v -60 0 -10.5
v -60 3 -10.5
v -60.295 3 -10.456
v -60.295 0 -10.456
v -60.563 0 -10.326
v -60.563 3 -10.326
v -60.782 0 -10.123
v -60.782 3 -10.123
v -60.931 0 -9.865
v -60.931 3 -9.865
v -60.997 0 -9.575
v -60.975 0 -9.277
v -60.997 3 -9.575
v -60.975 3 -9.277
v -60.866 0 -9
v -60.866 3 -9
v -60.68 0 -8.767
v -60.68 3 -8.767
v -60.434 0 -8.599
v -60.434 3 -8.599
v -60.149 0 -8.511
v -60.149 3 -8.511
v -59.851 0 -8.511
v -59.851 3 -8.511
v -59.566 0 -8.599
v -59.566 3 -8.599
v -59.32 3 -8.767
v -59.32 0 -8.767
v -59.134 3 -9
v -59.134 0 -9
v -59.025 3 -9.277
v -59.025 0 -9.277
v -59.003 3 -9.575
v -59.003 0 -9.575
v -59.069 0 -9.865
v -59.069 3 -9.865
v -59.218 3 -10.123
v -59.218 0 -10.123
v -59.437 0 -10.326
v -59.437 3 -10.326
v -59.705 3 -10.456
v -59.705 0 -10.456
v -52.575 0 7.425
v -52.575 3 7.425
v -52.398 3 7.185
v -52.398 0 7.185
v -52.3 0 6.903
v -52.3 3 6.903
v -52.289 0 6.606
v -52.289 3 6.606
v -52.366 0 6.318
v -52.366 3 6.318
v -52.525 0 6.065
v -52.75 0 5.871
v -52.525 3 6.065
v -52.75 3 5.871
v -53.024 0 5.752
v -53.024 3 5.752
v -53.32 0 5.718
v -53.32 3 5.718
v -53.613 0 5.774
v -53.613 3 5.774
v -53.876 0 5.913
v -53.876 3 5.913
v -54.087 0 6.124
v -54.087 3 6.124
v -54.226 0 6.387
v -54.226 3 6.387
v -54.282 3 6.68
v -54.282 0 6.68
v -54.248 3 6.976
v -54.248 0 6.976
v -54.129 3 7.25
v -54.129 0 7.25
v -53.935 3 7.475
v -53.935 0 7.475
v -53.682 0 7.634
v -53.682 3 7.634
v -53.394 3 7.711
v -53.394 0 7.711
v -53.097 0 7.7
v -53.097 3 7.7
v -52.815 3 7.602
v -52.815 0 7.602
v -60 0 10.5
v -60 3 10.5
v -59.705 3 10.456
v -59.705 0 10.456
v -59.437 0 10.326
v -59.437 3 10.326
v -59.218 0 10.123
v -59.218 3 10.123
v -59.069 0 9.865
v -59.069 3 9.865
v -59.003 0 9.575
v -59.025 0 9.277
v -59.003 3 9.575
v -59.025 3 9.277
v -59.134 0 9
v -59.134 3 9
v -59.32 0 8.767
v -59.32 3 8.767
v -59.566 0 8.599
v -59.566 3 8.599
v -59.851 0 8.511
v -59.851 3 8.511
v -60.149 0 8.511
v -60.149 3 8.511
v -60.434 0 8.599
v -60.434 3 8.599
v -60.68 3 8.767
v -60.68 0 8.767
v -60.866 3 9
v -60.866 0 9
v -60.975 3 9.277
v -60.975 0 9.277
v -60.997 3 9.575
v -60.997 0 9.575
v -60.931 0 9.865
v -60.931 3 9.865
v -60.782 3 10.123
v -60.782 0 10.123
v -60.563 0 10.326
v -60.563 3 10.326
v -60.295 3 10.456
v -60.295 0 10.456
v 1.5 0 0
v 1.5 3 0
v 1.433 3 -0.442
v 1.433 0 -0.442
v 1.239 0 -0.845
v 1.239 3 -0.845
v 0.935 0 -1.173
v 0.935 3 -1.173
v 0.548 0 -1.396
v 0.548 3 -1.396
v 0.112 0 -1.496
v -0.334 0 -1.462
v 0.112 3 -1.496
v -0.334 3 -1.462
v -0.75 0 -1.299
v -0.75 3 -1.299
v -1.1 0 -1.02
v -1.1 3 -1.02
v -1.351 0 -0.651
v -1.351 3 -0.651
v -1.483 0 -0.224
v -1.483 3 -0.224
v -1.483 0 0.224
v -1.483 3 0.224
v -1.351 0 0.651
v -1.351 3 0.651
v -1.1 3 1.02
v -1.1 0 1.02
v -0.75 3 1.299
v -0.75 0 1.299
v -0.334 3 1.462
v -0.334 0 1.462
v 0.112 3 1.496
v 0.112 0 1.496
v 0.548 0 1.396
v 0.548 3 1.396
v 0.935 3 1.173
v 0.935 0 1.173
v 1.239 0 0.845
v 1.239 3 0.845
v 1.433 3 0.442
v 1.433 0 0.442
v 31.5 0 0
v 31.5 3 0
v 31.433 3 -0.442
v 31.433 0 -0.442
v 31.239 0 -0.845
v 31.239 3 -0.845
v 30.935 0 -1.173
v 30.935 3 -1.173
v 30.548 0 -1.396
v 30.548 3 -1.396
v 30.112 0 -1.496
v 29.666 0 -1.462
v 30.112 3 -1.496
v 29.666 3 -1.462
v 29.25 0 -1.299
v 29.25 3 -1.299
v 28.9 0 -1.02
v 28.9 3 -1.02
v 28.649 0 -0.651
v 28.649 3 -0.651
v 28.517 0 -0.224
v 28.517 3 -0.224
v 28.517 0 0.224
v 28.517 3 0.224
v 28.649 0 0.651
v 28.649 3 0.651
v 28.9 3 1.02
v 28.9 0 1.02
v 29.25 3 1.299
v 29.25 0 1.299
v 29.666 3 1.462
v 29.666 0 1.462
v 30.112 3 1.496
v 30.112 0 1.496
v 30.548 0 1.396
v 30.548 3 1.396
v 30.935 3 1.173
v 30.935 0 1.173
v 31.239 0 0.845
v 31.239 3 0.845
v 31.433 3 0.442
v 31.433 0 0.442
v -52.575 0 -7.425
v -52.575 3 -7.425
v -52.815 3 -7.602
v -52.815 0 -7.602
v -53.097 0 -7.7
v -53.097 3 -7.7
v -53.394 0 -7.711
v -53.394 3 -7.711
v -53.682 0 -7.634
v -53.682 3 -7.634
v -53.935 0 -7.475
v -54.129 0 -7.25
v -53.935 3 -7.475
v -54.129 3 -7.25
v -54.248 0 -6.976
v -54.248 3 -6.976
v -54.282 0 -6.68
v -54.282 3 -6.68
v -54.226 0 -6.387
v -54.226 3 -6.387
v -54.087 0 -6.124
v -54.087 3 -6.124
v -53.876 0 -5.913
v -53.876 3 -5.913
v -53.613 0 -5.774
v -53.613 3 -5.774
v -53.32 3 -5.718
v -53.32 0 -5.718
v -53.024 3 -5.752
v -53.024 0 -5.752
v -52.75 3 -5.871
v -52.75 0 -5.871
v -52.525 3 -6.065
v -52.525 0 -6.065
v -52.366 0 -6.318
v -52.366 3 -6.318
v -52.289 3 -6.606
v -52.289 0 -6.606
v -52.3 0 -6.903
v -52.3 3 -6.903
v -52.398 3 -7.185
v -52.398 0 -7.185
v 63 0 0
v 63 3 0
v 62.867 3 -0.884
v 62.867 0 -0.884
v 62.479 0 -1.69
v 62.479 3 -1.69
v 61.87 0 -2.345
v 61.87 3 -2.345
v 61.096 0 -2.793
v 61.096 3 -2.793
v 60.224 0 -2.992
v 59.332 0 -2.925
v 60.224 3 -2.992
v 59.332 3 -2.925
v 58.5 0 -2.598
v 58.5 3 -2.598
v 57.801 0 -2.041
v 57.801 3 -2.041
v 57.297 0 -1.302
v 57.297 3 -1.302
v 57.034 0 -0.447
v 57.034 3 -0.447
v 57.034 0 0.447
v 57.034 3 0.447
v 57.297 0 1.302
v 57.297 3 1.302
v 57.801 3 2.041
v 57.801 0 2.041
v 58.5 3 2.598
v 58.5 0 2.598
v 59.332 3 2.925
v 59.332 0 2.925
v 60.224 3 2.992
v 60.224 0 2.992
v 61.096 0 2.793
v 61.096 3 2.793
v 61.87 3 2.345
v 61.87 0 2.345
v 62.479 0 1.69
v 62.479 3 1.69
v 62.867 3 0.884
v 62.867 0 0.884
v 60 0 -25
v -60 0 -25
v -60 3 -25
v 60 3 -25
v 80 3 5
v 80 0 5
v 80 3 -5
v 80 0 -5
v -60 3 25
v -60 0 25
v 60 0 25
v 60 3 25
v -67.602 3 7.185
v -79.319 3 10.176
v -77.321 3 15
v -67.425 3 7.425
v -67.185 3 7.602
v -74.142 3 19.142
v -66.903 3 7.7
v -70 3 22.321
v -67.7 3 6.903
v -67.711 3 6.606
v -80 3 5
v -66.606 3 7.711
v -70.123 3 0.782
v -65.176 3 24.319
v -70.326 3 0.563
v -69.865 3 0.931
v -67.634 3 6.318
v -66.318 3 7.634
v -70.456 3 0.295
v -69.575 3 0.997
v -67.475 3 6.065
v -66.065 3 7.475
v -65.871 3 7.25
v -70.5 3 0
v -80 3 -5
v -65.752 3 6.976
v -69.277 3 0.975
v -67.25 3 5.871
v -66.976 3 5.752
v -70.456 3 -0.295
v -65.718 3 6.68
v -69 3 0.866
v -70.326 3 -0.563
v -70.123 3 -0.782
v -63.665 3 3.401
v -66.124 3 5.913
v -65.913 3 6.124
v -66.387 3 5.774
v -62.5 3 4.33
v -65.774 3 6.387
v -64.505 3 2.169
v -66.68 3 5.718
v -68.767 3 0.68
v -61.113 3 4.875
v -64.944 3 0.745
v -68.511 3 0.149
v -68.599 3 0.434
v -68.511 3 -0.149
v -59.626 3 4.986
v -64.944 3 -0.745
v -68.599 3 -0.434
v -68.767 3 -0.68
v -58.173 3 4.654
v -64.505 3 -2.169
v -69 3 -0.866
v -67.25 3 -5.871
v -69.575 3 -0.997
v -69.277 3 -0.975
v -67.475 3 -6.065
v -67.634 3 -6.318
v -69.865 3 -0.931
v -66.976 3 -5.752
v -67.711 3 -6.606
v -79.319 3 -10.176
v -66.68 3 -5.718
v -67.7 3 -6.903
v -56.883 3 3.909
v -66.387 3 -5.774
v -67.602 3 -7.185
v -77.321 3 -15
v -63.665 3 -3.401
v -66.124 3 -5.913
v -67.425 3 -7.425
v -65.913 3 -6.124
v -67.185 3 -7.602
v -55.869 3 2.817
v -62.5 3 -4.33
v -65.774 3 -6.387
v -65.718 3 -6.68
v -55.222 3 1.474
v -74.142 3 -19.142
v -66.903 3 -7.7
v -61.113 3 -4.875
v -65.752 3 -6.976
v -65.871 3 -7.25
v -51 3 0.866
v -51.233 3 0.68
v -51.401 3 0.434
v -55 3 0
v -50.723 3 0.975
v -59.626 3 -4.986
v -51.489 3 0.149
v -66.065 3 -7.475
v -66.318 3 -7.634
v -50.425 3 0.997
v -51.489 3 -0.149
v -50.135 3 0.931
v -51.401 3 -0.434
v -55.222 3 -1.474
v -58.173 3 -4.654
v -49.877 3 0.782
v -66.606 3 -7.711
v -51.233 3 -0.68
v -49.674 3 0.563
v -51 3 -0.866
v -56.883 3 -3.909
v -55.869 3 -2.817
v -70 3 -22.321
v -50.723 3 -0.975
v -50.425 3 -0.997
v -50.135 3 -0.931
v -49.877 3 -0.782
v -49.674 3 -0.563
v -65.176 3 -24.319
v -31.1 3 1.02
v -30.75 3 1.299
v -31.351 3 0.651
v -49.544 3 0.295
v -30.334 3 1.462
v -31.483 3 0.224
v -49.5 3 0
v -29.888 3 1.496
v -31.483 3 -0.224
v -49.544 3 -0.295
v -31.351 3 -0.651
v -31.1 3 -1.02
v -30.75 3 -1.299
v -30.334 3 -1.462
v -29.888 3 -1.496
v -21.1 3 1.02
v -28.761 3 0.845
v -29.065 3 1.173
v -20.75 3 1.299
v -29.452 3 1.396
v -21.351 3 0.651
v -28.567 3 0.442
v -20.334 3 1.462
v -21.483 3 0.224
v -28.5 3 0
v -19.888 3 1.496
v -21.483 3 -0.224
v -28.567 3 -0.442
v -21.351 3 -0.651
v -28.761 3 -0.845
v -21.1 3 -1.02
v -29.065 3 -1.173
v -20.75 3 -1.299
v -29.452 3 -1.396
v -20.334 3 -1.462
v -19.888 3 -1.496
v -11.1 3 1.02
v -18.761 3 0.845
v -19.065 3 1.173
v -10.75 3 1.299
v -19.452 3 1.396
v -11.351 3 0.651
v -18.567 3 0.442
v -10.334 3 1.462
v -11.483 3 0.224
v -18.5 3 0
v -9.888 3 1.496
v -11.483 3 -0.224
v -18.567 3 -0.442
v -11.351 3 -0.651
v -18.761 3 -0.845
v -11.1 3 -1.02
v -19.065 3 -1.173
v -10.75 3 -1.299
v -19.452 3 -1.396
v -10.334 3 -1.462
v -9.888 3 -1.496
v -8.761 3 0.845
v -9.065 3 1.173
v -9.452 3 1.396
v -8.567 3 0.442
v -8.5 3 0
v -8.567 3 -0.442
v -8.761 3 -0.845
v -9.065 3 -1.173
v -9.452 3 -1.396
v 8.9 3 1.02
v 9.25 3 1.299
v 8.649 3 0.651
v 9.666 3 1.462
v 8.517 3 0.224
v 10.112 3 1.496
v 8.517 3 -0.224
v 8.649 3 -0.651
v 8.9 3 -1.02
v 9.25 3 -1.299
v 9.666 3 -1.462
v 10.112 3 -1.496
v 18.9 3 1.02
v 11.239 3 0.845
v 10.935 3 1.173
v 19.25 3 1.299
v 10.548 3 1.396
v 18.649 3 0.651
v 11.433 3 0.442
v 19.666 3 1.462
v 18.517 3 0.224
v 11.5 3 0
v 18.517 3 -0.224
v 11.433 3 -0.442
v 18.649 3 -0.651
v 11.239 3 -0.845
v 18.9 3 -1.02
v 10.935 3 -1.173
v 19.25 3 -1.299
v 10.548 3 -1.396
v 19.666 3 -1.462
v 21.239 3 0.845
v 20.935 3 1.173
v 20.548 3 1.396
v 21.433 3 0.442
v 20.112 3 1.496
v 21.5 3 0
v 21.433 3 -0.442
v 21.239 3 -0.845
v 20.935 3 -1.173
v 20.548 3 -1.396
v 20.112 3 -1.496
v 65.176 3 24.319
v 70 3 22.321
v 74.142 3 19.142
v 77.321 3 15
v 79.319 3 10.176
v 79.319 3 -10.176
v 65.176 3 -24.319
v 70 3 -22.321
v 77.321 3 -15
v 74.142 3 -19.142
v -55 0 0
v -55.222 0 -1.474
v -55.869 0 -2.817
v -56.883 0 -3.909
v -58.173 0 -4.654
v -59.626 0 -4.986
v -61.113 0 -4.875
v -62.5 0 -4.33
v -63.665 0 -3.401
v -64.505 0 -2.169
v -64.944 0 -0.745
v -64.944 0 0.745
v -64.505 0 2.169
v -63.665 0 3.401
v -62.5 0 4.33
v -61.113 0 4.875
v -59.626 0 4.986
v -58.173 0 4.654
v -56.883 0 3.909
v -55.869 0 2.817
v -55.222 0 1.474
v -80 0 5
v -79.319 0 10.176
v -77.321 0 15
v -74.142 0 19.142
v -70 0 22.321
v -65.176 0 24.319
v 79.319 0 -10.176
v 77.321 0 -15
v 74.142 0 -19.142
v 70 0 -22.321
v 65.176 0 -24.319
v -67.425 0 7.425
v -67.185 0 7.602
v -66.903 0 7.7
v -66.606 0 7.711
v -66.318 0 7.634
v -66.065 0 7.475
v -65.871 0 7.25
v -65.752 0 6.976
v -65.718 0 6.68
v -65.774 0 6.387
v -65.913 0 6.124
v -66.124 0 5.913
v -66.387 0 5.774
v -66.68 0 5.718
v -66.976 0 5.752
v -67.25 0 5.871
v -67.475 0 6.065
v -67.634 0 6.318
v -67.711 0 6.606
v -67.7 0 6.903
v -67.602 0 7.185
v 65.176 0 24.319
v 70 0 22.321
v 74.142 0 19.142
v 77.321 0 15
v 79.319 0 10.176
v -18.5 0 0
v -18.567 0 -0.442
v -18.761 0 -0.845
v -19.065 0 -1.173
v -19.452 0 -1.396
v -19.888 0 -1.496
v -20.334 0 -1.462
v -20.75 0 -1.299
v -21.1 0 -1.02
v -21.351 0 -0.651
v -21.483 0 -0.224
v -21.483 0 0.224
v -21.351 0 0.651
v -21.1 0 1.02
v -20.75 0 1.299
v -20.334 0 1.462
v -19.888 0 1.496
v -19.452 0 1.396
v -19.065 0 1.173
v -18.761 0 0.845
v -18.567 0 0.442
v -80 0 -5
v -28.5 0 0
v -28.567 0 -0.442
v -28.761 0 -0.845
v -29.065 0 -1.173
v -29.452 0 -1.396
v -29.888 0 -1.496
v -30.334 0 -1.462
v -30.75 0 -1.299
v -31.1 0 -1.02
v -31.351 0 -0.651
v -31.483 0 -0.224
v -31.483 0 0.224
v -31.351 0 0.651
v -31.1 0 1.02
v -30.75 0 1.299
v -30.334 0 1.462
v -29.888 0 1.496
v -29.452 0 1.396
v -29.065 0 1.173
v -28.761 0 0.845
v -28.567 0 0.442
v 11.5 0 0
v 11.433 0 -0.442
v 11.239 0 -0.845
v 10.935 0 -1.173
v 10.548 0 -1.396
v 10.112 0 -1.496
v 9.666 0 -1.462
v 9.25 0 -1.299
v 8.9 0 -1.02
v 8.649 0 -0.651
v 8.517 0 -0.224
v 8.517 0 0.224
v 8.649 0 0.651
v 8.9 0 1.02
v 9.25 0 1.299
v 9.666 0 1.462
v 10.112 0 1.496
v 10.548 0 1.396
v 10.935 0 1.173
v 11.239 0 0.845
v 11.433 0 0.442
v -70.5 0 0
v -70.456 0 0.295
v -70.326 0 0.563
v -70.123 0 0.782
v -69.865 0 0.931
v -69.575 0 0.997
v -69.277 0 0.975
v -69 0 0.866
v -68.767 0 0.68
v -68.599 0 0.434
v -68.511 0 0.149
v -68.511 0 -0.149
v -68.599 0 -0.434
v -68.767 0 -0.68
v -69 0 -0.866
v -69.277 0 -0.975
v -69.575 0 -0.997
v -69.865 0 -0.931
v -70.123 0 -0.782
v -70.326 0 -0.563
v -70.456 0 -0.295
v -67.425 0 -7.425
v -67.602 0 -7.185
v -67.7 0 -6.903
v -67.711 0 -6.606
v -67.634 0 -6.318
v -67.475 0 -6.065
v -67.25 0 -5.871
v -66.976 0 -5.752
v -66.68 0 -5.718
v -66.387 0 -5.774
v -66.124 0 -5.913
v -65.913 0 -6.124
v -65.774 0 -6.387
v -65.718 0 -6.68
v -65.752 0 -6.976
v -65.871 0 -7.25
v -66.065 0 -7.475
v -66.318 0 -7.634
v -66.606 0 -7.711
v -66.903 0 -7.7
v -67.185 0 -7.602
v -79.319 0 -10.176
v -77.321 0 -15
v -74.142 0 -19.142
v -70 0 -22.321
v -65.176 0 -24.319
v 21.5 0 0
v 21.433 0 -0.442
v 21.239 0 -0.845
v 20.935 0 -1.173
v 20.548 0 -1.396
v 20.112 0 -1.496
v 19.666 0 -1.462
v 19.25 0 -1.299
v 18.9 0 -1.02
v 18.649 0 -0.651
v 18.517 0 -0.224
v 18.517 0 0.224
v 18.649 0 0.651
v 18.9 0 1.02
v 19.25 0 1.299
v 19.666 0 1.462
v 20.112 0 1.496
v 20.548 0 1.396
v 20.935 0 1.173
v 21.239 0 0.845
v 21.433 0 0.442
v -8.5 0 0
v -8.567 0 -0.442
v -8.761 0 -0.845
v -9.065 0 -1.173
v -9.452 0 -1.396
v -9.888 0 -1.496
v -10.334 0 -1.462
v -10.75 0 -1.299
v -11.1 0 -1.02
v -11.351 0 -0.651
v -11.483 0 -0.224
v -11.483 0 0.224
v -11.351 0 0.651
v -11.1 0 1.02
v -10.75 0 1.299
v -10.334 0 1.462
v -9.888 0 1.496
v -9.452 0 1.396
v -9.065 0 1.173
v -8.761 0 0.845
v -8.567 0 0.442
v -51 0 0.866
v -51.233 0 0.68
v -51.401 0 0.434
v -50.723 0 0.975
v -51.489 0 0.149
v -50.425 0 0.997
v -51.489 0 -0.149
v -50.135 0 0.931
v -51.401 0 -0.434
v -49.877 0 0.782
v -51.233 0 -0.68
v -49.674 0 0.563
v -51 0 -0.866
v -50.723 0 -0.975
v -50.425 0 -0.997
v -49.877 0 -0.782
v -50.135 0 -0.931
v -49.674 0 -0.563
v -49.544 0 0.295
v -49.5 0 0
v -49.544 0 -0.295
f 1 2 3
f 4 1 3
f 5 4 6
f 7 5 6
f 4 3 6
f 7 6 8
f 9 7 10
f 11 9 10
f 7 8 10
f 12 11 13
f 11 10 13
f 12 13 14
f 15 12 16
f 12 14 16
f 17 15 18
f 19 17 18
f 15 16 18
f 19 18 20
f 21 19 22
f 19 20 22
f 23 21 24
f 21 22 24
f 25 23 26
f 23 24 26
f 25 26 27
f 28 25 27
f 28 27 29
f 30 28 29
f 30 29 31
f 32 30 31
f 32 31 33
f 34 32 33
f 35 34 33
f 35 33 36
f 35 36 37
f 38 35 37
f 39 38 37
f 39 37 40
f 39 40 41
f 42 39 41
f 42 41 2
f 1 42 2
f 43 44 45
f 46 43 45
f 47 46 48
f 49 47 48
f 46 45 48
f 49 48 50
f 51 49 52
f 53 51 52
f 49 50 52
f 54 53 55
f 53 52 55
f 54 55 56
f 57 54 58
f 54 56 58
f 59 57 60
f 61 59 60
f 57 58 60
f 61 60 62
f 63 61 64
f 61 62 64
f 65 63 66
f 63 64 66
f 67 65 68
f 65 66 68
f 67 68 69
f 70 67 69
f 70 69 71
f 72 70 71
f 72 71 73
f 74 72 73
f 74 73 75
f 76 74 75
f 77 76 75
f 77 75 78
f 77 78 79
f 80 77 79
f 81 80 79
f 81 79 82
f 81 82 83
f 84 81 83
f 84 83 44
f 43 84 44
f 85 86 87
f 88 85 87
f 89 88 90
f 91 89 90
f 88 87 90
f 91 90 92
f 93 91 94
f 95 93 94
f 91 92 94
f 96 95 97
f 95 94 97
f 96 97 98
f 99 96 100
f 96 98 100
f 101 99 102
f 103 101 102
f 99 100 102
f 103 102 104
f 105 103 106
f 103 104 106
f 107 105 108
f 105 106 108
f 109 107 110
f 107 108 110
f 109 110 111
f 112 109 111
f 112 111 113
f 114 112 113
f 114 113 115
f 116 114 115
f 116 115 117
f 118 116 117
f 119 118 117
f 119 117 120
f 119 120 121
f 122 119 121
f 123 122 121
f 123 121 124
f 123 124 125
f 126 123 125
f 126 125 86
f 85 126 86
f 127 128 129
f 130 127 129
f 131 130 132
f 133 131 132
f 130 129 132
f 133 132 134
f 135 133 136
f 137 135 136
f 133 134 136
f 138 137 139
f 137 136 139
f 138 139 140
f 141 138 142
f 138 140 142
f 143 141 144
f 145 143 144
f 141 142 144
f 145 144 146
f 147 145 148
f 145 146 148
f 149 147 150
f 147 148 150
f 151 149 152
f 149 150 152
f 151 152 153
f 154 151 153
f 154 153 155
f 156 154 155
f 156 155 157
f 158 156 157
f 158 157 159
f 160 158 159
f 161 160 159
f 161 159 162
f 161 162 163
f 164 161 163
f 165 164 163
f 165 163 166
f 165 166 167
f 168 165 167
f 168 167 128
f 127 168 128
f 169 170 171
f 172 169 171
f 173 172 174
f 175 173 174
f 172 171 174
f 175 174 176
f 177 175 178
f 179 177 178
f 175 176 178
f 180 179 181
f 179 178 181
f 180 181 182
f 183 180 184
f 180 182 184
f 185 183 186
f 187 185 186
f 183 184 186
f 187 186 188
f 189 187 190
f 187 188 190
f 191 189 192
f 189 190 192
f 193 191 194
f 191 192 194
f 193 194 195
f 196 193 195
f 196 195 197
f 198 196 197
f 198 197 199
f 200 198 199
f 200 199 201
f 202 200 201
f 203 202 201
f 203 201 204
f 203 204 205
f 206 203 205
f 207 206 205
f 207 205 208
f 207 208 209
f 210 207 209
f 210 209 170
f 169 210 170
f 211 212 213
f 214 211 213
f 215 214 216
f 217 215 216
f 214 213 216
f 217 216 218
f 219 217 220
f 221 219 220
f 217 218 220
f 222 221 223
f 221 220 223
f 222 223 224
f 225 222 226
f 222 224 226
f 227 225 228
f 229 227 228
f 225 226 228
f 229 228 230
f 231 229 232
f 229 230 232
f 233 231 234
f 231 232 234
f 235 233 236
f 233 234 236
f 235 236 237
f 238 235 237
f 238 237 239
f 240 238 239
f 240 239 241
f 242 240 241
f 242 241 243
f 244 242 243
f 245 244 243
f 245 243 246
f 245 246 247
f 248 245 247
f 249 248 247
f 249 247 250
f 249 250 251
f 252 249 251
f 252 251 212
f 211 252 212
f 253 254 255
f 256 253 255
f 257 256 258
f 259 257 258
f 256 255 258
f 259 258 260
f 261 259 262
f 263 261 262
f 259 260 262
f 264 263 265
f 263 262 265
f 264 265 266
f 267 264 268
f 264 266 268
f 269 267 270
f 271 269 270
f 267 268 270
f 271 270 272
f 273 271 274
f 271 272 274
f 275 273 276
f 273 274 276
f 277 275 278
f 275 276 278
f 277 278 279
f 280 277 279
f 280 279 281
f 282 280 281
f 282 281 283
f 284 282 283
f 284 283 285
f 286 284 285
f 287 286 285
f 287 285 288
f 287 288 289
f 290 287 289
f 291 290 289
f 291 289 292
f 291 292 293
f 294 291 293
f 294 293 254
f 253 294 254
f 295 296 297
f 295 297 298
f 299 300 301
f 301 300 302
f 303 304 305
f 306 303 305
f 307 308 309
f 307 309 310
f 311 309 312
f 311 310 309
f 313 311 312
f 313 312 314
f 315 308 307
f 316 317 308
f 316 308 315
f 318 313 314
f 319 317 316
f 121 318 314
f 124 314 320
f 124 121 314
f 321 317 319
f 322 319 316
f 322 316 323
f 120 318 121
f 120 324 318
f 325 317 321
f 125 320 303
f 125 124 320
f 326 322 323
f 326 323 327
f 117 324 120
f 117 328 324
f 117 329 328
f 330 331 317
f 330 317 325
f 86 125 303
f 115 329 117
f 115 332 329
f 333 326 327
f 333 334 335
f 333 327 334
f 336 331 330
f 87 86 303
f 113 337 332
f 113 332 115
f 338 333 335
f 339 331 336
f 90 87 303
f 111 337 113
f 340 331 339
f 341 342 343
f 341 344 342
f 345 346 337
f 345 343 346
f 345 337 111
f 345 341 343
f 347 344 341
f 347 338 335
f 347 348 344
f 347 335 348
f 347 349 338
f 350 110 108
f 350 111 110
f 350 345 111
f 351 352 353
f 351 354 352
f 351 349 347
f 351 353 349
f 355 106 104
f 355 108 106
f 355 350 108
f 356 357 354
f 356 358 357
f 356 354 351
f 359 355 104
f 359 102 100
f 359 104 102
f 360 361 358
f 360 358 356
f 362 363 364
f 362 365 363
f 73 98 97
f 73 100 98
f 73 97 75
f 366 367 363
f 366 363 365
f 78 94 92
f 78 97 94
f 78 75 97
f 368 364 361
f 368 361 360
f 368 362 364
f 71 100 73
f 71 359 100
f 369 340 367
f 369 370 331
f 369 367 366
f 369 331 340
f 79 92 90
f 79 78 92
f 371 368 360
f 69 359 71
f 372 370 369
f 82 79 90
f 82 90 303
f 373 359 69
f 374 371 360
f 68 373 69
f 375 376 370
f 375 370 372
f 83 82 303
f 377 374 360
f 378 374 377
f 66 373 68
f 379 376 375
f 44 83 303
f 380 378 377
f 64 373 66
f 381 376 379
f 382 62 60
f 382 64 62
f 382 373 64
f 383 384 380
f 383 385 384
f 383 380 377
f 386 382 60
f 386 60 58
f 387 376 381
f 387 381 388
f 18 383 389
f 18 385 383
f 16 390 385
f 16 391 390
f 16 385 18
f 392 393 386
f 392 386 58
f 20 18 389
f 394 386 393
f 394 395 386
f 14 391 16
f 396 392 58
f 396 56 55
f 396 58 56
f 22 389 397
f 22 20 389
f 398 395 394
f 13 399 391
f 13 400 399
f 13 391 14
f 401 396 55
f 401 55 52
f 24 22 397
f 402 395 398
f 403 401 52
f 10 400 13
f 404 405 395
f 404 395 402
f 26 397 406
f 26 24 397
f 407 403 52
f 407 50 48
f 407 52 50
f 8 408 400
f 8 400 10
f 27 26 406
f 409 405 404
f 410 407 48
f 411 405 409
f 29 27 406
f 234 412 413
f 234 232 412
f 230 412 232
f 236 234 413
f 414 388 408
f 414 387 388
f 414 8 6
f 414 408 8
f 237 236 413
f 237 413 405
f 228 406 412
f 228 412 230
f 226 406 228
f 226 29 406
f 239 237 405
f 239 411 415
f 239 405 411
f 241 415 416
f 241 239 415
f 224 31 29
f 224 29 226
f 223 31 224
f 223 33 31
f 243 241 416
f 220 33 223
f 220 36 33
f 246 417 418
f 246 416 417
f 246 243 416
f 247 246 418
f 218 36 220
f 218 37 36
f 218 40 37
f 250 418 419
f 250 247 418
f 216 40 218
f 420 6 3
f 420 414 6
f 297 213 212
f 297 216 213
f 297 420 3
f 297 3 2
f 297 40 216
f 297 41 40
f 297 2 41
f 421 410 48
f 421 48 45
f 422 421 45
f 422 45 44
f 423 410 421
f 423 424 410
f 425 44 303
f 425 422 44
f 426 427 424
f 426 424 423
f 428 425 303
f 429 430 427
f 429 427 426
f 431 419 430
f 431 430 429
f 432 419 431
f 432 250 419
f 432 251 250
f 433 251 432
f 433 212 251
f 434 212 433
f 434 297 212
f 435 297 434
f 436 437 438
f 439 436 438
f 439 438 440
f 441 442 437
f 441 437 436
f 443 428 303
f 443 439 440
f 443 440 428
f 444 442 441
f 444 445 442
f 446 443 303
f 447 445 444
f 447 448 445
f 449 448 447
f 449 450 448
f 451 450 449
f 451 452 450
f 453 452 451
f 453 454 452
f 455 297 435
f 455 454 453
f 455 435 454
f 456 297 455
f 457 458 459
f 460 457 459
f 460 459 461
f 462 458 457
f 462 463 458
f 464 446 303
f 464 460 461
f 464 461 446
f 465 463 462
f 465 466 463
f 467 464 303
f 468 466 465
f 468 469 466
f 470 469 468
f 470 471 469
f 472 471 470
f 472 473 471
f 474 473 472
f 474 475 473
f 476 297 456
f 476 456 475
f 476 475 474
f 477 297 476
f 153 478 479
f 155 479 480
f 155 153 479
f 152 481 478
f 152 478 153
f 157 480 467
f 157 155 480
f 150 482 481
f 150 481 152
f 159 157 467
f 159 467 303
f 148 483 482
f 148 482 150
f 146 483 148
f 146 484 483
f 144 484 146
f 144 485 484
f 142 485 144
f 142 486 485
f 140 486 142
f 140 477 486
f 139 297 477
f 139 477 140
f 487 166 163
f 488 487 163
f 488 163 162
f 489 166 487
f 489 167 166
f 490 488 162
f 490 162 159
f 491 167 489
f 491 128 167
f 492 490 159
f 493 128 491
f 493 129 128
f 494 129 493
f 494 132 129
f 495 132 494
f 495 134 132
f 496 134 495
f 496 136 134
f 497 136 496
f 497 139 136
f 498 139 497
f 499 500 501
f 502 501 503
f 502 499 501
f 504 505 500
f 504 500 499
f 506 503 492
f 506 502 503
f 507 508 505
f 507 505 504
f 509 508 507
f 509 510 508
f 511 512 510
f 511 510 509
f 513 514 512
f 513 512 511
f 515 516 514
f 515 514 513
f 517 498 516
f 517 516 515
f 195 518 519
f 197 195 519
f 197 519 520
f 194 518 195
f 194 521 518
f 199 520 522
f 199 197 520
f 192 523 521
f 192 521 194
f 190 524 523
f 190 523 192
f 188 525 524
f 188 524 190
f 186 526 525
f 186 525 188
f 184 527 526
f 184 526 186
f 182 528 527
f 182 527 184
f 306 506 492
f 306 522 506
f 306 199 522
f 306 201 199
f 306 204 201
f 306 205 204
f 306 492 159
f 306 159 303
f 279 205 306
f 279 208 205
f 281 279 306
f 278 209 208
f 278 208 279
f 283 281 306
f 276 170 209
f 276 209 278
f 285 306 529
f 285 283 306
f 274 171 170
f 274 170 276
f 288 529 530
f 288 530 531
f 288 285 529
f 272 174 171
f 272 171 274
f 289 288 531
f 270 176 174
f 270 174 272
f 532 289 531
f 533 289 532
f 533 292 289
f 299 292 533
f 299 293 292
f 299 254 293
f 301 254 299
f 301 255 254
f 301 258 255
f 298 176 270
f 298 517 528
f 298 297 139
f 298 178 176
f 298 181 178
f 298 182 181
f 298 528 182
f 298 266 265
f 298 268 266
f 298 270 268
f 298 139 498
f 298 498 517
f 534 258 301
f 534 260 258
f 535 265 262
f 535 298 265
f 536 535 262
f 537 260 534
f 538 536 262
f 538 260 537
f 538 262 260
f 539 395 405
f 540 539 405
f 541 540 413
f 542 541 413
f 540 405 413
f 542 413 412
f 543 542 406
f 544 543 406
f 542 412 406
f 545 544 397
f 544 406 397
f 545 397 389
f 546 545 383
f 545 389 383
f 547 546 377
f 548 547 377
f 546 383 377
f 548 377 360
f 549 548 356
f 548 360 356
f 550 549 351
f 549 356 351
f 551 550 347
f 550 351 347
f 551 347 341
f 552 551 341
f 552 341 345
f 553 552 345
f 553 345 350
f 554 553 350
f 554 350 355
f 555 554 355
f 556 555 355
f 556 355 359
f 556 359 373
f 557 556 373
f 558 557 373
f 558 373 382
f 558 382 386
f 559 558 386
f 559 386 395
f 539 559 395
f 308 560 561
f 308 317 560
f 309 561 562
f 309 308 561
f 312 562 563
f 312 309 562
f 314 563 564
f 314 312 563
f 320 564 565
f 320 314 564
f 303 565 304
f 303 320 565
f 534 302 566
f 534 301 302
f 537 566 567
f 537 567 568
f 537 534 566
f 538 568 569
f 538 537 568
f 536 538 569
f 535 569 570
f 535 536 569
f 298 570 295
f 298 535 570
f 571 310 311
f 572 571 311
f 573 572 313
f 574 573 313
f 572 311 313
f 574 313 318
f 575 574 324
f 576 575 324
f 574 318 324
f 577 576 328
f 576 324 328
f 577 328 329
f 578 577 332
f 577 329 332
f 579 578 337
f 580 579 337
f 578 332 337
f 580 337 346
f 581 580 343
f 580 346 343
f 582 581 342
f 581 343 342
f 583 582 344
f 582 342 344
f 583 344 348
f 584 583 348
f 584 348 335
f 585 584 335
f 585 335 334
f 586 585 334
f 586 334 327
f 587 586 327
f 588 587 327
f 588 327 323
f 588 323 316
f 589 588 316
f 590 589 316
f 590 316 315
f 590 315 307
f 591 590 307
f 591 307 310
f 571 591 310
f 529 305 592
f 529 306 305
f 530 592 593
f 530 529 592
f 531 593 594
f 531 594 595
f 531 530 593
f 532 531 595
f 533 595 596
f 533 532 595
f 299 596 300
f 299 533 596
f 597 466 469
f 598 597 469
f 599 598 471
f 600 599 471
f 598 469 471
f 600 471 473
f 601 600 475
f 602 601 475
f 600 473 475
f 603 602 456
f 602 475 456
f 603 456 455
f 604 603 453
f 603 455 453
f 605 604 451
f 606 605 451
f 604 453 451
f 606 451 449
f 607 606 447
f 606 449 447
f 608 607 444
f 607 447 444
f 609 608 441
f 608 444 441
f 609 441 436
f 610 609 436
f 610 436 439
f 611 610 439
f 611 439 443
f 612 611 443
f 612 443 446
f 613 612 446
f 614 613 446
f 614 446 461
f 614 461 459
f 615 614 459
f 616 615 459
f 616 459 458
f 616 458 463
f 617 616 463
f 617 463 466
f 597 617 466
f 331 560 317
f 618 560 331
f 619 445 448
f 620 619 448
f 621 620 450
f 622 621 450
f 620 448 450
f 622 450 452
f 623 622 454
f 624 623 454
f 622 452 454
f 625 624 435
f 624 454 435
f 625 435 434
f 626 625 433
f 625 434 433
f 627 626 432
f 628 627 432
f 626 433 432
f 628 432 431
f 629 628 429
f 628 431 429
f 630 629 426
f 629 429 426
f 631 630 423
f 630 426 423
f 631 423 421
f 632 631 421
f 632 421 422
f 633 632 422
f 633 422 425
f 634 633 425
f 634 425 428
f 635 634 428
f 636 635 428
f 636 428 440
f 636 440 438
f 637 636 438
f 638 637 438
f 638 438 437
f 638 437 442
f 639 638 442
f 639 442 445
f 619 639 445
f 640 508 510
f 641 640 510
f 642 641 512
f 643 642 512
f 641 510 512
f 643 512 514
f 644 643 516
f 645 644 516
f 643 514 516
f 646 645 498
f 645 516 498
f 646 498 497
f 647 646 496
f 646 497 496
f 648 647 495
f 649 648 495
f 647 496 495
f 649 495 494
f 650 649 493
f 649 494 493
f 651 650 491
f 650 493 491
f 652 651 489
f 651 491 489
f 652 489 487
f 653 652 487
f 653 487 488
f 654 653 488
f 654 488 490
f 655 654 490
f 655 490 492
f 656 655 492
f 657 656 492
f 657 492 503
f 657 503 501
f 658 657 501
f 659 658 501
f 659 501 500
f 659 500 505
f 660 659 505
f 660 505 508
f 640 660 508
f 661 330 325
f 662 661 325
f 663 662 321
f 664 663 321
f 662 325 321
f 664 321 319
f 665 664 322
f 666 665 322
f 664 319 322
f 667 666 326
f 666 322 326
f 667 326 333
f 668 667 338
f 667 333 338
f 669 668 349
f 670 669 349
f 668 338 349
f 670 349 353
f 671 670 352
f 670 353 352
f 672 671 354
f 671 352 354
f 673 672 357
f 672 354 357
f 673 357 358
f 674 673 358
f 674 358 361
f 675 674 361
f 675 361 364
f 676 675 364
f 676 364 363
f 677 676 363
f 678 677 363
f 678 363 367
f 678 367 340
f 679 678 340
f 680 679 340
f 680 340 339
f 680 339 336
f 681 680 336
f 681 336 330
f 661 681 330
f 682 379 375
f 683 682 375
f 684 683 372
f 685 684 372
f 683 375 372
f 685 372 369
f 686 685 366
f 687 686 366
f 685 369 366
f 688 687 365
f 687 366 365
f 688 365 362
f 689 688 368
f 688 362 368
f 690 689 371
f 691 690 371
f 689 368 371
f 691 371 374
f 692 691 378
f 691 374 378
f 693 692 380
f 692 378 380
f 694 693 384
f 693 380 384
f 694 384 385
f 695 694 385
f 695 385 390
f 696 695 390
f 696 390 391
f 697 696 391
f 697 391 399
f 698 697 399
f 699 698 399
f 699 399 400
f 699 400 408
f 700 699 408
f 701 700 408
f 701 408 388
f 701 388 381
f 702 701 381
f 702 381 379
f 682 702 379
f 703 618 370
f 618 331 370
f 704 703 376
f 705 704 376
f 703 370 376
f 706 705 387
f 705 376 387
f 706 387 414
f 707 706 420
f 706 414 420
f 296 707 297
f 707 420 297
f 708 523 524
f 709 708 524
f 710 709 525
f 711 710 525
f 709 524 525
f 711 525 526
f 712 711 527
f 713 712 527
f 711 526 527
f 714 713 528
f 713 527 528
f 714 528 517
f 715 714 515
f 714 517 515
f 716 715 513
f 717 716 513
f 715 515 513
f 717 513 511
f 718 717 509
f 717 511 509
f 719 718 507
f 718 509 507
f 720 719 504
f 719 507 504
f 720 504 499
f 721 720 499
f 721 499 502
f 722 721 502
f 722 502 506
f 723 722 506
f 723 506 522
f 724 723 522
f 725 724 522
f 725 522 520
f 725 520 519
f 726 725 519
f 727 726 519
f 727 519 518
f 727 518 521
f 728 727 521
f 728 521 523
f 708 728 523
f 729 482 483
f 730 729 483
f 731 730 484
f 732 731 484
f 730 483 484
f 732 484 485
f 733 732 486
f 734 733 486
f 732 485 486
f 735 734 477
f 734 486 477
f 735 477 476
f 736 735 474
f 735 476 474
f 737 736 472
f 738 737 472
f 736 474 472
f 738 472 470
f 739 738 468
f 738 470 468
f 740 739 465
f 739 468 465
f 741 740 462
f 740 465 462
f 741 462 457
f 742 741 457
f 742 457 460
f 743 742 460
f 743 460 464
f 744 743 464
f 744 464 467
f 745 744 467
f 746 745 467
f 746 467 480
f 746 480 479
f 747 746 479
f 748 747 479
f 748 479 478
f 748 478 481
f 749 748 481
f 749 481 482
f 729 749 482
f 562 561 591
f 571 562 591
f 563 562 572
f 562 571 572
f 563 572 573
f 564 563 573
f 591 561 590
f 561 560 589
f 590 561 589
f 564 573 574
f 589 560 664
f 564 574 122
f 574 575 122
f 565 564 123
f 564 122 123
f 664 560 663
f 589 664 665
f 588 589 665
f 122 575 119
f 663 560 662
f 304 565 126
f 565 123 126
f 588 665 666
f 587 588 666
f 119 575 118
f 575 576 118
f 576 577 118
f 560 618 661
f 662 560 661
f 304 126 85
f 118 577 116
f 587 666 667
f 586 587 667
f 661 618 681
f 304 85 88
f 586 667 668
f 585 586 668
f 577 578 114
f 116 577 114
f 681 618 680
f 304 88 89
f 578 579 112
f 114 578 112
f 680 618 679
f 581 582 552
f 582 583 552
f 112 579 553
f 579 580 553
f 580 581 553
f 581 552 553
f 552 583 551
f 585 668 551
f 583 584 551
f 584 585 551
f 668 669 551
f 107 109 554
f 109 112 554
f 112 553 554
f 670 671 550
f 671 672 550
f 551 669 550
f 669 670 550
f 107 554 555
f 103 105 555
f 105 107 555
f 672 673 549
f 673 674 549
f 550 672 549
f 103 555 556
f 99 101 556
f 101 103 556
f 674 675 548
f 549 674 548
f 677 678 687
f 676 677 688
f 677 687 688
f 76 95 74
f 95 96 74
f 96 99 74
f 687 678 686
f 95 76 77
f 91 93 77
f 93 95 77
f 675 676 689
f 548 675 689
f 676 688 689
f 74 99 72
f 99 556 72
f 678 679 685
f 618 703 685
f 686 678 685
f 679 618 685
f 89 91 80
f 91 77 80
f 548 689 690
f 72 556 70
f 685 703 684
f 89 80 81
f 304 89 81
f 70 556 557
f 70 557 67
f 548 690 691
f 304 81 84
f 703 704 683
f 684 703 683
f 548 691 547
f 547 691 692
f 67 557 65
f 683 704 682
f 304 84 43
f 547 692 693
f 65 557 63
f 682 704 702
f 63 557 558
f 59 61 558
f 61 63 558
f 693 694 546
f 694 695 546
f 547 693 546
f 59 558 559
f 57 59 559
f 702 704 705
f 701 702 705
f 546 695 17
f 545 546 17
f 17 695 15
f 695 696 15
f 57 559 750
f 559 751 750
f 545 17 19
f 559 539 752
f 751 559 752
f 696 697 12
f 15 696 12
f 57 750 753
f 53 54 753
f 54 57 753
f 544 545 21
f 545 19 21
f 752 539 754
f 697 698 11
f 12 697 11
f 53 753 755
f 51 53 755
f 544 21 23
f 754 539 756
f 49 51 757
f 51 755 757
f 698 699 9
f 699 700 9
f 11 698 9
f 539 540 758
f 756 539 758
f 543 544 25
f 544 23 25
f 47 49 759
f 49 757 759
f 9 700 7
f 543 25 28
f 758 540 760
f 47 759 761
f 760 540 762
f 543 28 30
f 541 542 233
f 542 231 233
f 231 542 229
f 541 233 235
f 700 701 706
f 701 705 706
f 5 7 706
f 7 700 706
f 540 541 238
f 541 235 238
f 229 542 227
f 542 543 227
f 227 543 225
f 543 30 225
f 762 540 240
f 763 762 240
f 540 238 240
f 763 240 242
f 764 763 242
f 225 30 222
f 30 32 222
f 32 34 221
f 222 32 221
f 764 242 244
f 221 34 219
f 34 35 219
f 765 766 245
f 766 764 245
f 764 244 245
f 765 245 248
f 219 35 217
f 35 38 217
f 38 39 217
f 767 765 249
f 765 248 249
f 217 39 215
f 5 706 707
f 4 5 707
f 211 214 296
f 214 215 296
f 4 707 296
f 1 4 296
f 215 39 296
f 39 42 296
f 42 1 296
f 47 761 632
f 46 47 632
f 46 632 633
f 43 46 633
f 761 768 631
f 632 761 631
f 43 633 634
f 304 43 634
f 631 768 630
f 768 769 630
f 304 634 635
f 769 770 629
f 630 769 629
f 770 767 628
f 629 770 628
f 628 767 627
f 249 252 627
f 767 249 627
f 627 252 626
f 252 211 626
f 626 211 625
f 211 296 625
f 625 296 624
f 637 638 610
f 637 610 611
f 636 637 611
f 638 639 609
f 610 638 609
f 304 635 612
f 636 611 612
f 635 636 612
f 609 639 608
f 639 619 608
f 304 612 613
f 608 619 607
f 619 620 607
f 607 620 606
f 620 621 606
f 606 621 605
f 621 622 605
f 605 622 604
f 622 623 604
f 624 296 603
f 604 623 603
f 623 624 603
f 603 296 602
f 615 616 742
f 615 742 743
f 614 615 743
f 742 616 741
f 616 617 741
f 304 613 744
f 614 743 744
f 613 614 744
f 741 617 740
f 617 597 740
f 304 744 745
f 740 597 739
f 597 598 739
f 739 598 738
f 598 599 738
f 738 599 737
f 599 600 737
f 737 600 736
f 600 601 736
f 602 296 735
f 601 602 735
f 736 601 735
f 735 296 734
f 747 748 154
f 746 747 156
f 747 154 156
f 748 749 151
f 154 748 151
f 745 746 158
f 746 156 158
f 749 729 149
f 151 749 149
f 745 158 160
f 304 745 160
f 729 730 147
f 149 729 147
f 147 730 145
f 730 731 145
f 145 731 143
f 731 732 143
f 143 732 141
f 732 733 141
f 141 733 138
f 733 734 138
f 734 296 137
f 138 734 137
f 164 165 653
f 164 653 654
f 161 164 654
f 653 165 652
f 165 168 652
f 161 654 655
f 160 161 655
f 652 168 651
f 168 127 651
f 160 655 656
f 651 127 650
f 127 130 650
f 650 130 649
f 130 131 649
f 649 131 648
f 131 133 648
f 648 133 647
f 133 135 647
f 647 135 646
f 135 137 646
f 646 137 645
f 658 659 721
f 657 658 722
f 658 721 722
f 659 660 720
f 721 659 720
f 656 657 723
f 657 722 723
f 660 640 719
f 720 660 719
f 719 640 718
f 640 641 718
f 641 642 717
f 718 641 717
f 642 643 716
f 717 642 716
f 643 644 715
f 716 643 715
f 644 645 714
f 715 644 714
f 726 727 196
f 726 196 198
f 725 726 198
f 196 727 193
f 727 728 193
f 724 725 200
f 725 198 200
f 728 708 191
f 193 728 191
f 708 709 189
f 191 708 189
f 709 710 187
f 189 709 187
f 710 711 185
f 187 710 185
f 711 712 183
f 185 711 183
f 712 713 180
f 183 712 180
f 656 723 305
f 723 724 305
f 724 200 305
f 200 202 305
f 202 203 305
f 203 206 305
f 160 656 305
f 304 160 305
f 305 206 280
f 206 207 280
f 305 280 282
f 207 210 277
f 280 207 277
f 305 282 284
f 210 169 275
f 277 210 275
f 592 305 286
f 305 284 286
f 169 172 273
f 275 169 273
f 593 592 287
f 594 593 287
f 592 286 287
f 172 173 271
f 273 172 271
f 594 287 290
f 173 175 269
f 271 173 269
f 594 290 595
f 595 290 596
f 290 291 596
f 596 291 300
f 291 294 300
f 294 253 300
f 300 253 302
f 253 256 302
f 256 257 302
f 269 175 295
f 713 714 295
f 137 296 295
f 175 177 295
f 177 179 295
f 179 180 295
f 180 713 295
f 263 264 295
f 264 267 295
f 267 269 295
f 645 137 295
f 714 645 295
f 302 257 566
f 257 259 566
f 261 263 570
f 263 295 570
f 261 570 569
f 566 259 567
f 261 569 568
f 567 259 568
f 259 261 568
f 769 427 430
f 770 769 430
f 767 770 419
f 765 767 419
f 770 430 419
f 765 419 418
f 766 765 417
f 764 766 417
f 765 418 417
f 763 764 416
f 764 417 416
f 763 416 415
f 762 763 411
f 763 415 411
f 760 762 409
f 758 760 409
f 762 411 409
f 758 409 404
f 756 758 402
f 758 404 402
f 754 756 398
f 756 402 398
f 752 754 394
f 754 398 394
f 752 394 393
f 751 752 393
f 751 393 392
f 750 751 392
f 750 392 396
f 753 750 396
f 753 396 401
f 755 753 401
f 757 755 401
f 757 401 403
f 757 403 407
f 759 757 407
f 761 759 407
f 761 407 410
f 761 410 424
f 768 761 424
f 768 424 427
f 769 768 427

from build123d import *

# Parameters (mm, degrees)
SKETCH1_W           = 160
SKETCH1_H           = 50
BOSS_EXTRUDE1_DEPTH = 3
FILLET1_R           = 20
SKETCH2_R           = 5
CUT_EXTRUDE1_DEPTH  = 4
SKETCH3_R           = 1
CUT_EXTRUDE2_DEPTH  = 4
CIRPATTERN1_COUNT   = 8
SKETCH4_R           = 3
CUT_EXTRUDE3_DEPTH  = 4
SKETCH5_R           = 1.5
CUT_EXTRUDE4_DEPTH  = 4
LPATTERN1_COUNT     = 4
LPATTERN1_PITCH     = 10
LPATTERN1_COL_COUNT = 4
LPATTERN1_COL_PITCH = 10


with BuildPart() as part:
    # Sketch1 → Boss-Extrude1 (new body)
    with BuildSketch(Plane(origin=(0, 0, 0), x_dir=(1, 0, 0), z_dir=(0, 1, 0))):
        Rectangle(SKETCH1_W, SKETCH1_H)
    extrude(amount=BOSS_EXTRUDE1_DEPTH)

    # Fillet1
    fillet1_edges = [part.edges().sort_by_distance(p)[0] for p in [
        (80, 1.5, 25),
        (-80, 1.5, 25),
        (-80, 1.5, -25),
        (80, 1.5, -25),
    ]]
    fillet(fillet1_edges, radius=FILLET1_R)

    # Sketch2 → Cut-Extrude1 (cut, through all)
    with BuildSketch(Plane(origin=(0, 3, 0), x_dir=(1, 0, 0), z_dir=(0, 1, 0))):
        with Locations((-60, 0)):
            Circle(SKETCH2_R)
    extrude(amount=-CUT_EXTRUDE1_DEPTH, mode=Mode.SUBTRACT)

    # Sketch3 → Cut-Extrude2 (cut, through all)
    with BuildSketch(Plane(origin=(0, 3, 0), x_dir=(1, 0, 0), z_dir=(0, 1, 0))):
        with Locations((-50.5, 0)):
            Circle(SKETCH3_R)
    cut_extrude2 = extrude(amount=-CUT_EXTRUDE2_DEPTH, mode=Mode.SUBTRACT)

    # CirPattern1: Cut-Extrude2 ×8 about axis
    cirpattern1_axis = Axis((-60, 0, 0), (0, 1, 0))
    for i in range(1, CIRPATTERN1_COUNT):
        add(cut_extrude2.rotate(cirpattern1_axis, i * 360 / CIRPATTERN1_COUNT), mode=Mode.SUBTRACT)

    # Sketch4 → Cut-Extrude3 (cut, through all)
    with BuildSketch(Plane(origin=(0, 3, 0), x_dir=(1, 0, 0), z_dir=(0, 1, 0))):
        with Locations((60, 0)):
            Circle(SKETCH4_R)
    extrude(amount=-CUT_EXTRUDE3_DEPTH, mode=Mode.SUBTRACT)

    # Sketch5 → Cut-Extrude4 (cut, through all)
    with BuildSketch(Plane(origin=(0, 3, 0), x_dir=(1, 0, 0), z_dir=(0, 1, 0))):
        Circle(SKETCH5_R)
    cut_extrude4 = extrude(amount=-CUT_EXTRUDE4_DEPTH, mode=Mode.SUBTRACT)

    # LPattern1: Cut-Extrude4 ×4
    with Locations(*[(i * LPATTERN1_PITCH, 0, 0) for i in range(1, LPATTERN1_COUNT)]):
        add(cut_extrude4, mode=Mode.SUBTRACT)

    # LPattern1 col: Cut-Extrude4 ×4
    with Locations(*[(-i * LPATTERN1_COL_PITCH, 0, 0) for i in range(1, LPATTERN1_COL_COUNT)]):
        add(cut_extrude4, mode=Mode.SUBTRACT)


solid = part.part
